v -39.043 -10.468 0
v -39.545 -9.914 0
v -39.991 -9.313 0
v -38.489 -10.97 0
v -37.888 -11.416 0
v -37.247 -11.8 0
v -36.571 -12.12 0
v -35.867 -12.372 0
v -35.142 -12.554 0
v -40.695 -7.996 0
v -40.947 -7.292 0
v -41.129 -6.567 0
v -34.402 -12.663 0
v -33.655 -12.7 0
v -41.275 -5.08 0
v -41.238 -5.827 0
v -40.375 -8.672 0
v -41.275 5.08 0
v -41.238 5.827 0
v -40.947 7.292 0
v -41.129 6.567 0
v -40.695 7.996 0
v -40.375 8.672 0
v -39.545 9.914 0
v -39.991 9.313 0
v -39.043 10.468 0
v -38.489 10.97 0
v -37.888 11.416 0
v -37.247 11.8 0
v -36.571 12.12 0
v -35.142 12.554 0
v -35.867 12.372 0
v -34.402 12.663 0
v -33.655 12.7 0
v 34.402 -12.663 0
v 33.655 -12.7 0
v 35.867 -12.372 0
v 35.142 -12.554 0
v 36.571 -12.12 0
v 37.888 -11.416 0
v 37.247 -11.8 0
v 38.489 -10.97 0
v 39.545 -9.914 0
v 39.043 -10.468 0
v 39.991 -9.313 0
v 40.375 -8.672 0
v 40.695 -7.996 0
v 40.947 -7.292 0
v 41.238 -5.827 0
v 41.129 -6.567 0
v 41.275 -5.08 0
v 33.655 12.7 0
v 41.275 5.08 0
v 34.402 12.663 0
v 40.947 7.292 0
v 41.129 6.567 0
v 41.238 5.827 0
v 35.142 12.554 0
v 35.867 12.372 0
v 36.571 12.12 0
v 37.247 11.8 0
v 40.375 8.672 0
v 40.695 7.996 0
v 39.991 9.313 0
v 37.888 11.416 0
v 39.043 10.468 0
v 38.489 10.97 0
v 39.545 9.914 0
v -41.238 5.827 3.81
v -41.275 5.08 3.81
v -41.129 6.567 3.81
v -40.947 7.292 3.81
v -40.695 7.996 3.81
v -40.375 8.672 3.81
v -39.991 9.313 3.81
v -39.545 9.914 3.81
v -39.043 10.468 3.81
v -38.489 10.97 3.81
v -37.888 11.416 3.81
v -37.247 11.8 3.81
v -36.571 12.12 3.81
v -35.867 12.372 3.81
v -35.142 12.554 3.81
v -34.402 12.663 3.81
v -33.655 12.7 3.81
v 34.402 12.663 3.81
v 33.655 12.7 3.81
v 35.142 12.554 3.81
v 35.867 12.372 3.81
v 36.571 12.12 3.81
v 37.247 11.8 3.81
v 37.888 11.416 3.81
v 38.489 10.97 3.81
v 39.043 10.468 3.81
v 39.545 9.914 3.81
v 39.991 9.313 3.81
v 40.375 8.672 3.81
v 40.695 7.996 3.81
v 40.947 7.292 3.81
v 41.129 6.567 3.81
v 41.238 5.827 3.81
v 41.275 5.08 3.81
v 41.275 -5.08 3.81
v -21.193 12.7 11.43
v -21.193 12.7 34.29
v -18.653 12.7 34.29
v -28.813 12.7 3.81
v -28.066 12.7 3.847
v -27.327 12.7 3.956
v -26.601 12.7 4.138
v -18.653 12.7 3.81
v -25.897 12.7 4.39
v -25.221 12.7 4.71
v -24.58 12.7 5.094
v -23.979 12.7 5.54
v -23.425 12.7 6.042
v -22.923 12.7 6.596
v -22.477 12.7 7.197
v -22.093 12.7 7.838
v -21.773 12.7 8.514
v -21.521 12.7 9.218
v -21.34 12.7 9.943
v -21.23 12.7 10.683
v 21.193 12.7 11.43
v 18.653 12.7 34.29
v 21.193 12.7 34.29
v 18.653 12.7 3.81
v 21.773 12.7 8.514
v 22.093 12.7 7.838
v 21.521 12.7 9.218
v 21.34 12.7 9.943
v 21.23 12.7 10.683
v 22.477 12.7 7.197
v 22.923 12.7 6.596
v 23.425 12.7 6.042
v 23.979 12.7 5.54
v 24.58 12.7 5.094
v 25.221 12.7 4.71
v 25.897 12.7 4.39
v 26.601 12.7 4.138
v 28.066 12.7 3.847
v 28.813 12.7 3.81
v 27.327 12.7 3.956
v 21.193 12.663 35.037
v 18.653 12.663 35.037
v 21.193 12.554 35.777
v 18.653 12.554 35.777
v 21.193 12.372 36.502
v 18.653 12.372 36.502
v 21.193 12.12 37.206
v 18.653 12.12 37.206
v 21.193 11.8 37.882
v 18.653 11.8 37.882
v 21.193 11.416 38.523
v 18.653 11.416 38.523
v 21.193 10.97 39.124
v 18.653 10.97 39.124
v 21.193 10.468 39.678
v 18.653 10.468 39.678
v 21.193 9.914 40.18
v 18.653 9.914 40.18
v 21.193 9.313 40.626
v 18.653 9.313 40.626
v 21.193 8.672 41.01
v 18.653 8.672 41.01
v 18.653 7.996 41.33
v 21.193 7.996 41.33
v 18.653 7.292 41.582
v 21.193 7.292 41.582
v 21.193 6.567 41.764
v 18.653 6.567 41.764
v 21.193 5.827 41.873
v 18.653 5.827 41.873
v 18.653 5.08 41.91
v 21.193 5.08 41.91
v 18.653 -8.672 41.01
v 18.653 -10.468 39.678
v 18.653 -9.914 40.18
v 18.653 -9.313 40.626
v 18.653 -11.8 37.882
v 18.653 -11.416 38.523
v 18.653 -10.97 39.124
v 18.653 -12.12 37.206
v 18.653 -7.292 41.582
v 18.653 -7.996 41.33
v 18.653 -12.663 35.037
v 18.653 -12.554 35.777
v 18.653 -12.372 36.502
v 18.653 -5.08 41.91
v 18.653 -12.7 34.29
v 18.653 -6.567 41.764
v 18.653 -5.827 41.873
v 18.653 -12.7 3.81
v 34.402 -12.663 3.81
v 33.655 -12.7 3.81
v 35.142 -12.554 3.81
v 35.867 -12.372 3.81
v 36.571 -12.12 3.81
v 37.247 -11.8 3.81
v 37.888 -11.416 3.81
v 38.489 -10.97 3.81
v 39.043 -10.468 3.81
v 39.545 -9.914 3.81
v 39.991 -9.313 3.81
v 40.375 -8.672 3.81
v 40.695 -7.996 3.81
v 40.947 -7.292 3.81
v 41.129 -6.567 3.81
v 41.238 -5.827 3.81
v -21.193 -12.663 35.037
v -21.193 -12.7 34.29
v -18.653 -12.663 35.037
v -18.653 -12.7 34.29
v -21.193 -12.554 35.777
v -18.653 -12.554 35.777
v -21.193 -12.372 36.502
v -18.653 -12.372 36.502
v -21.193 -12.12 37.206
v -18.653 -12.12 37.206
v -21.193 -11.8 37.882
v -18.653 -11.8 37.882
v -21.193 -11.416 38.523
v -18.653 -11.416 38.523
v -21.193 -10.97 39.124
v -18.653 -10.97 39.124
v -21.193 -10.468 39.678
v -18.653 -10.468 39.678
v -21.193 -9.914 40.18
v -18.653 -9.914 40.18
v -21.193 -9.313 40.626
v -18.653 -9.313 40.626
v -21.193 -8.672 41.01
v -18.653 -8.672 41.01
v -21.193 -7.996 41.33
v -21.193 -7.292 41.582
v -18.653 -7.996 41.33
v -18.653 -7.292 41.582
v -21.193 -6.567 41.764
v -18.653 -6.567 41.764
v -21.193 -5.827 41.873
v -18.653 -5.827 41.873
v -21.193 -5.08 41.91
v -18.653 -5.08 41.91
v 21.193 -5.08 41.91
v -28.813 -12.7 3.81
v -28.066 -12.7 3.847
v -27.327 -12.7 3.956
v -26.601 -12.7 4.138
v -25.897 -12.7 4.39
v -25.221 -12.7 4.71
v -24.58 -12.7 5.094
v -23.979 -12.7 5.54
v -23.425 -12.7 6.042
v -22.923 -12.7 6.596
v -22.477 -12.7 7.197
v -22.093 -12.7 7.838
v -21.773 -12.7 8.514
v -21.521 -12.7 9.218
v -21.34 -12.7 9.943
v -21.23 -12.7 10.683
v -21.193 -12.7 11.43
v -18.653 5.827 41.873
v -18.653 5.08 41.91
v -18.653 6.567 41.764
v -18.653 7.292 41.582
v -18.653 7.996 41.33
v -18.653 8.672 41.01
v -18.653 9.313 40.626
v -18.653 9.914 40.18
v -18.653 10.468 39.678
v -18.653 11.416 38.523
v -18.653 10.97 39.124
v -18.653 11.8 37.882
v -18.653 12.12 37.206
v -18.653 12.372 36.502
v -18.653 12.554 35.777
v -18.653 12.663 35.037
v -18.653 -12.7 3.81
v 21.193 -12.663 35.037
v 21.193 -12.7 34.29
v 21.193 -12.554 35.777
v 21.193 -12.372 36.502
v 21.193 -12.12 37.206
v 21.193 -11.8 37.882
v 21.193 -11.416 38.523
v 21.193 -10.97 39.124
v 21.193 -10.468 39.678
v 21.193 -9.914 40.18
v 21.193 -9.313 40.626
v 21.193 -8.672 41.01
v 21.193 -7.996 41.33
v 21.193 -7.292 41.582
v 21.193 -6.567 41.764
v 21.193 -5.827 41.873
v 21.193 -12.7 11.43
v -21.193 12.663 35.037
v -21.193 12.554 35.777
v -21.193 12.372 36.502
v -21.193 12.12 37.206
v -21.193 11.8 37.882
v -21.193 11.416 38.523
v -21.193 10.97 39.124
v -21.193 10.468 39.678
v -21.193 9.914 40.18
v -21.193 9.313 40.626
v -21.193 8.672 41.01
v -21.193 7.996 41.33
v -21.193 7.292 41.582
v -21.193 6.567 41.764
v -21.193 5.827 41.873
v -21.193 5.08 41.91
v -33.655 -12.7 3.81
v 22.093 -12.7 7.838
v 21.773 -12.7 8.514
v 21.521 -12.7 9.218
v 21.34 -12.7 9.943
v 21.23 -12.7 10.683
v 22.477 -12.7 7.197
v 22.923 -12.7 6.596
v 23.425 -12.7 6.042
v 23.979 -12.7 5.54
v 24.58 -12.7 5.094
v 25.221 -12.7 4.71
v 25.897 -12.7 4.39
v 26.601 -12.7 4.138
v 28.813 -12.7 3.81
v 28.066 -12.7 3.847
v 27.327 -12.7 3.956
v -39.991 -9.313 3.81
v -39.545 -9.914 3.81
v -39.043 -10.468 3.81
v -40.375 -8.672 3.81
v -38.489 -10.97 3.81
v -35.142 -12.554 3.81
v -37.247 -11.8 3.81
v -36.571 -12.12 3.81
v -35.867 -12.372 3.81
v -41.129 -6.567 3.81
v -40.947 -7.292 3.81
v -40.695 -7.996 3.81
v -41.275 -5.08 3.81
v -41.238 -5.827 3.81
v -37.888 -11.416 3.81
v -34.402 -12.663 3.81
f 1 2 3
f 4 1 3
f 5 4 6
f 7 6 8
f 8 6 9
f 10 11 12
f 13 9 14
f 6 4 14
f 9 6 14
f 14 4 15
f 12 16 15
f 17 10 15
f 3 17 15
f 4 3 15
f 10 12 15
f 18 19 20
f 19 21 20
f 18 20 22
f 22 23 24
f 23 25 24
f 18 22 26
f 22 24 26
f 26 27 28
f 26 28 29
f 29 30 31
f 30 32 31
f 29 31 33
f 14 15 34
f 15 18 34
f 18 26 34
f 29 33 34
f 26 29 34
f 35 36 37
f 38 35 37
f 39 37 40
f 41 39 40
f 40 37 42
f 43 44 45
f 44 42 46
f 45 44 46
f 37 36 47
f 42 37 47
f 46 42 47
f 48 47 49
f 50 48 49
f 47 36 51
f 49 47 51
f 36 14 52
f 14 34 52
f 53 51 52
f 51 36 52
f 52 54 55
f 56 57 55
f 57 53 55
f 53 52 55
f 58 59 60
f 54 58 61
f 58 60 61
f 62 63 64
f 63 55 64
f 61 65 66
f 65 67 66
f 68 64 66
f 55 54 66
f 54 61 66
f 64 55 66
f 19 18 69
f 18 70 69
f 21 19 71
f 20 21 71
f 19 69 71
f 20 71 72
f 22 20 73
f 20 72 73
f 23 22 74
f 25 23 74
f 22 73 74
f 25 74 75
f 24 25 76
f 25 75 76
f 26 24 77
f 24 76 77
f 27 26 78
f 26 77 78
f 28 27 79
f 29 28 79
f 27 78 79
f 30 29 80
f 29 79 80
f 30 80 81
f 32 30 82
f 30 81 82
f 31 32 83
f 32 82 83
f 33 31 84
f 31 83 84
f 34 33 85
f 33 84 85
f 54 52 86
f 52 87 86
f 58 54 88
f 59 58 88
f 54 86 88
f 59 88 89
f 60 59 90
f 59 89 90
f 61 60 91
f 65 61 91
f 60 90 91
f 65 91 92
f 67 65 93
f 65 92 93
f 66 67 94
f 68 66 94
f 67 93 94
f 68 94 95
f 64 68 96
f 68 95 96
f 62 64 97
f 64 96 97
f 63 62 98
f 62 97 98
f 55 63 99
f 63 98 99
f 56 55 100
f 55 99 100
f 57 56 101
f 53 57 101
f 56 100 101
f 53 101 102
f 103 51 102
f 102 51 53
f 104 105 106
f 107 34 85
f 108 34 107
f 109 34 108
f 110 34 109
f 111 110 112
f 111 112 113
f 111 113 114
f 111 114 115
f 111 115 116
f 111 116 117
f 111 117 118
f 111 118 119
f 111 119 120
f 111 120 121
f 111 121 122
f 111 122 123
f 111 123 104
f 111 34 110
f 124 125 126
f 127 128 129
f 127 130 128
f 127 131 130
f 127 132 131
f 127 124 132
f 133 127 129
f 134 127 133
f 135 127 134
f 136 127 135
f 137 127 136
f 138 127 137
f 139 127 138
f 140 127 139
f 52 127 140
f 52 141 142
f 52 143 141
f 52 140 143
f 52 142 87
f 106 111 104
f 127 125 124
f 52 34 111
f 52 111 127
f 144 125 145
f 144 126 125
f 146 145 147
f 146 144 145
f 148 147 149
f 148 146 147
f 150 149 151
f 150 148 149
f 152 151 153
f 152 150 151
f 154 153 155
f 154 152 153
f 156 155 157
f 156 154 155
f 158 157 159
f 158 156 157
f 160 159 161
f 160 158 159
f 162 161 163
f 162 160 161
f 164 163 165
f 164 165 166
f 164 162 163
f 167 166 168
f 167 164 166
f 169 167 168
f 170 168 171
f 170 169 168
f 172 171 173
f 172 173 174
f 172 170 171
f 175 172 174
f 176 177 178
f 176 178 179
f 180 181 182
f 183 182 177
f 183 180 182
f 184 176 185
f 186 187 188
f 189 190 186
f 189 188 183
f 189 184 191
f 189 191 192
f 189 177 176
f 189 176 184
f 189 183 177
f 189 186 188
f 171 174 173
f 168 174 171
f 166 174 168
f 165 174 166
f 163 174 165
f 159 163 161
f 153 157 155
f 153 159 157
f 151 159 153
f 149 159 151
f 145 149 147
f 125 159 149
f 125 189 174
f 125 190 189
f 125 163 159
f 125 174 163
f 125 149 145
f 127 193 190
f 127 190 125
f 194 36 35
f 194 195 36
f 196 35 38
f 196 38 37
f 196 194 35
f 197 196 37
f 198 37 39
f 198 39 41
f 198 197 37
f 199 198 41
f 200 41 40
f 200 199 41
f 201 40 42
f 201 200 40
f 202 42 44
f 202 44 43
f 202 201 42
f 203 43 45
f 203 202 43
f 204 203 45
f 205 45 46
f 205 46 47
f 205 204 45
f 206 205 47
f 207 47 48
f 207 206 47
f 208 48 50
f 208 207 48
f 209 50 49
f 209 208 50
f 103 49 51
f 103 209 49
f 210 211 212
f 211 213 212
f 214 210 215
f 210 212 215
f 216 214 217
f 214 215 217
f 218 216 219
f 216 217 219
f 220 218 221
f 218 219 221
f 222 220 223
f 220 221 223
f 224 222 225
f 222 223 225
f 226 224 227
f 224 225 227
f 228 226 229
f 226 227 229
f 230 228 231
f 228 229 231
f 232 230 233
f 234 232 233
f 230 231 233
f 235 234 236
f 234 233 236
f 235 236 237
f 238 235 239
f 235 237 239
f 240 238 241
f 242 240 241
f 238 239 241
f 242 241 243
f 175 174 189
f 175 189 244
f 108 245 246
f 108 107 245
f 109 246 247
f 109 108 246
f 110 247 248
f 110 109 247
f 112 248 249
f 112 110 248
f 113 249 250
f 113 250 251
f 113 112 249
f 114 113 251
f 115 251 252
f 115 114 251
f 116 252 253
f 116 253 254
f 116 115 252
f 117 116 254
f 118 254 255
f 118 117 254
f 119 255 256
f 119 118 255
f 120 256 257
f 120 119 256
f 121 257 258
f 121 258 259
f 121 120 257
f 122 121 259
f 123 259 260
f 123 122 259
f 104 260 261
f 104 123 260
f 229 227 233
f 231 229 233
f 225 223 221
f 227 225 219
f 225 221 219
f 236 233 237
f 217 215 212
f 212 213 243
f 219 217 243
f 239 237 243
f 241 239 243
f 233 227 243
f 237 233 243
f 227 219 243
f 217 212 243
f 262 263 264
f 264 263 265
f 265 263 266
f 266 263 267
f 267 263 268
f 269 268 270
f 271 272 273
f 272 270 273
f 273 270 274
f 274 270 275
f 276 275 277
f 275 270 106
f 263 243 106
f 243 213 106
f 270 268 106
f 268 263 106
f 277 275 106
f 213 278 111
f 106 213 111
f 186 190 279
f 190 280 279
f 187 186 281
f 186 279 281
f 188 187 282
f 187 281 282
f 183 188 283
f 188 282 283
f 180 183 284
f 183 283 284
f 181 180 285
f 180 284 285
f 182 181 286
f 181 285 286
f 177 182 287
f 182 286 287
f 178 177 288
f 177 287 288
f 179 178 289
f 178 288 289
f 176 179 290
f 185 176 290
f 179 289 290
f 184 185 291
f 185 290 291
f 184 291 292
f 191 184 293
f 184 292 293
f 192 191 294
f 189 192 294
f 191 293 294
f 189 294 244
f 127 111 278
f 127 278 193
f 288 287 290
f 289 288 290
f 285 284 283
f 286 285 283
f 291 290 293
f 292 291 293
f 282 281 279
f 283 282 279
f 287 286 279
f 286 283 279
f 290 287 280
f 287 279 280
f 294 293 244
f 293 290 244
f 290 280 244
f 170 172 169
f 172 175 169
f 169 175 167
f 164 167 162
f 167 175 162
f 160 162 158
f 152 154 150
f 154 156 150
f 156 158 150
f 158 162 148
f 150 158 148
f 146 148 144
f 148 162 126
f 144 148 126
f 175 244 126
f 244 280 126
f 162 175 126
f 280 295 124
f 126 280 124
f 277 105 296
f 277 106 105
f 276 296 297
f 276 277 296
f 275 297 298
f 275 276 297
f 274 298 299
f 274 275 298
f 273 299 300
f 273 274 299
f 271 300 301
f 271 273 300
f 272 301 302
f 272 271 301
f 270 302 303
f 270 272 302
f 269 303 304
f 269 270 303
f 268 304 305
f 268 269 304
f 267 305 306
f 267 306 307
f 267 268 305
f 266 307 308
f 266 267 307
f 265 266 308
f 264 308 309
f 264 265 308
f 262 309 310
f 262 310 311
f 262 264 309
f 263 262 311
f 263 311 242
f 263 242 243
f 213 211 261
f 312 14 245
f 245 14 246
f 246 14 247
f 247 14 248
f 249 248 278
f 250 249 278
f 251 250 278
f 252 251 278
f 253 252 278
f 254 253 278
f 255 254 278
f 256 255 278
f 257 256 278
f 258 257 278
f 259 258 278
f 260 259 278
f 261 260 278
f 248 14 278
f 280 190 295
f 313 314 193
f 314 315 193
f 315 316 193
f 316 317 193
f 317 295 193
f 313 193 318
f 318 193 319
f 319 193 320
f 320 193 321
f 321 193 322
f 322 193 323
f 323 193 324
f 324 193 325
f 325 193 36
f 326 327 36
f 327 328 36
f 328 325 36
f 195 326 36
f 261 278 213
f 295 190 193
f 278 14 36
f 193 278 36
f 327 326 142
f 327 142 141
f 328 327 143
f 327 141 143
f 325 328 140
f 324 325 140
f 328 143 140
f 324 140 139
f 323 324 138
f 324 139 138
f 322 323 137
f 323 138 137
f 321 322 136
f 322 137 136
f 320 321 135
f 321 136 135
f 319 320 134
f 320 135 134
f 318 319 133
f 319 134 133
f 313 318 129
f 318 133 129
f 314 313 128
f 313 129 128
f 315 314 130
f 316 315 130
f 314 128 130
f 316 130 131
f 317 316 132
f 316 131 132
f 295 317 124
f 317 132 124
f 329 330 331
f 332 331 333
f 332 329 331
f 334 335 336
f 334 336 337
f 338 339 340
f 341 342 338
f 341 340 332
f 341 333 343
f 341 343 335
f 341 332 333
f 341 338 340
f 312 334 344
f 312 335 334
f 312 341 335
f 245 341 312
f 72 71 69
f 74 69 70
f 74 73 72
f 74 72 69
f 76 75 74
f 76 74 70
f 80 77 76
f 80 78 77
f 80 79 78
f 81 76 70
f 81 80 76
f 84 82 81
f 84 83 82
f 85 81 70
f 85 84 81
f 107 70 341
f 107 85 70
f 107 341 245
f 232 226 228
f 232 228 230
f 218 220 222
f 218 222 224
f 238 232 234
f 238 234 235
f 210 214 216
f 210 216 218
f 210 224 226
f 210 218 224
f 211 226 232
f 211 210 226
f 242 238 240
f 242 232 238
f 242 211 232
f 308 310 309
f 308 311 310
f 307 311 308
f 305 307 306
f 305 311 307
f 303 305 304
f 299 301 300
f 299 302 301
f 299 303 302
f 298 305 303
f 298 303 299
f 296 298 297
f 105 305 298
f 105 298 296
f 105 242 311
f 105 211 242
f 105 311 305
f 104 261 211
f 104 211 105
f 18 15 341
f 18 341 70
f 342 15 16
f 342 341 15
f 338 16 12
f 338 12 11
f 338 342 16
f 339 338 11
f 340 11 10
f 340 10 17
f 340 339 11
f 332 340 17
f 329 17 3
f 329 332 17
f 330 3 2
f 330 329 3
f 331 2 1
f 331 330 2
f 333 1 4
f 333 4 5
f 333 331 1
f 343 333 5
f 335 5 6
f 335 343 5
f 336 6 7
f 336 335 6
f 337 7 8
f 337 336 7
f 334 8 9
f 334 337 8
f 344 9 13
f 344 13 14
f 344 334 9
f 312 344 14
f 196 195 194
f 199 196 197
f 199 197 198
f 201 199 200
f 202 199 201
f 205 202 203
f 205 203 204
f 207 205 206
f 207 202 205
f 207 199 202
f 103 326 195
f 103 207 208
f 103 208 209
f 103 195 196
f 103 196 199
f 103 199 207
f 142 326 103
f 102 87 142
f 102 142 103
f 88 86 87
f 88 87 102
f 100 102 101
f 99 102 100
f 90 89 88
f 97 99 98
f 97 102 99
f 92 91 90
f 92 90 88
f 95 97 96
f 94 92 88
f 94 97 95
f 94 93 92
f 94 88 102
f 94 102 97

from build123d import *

# Parameters (mm, degrees)
F0_W     = 82.55
F0_H     = 25.4
F1_DEPTH = 3.81
F2_W     = 2.54
F2_H     = 25.4
F3_DEPTH = 38.1
F4_R     = 7.62


with BuildPart() as f1:
    # F0 (on Top) → F1 (new body)
    with BuildSketch(Plane.XY):
        Rectangle(F0_W, F0_H)
    extrude(amount=F1_DEPTH)

    # F2 (on face) → F3 (join)
    with BuildSketch(Plane.XY.offset(3.81)):
        with Locations((-19.923125, 0)):
            Rectangle(F2_W, F2_H)
        with Locations((19.923125, 0)):
            Rectangle(F2_W, F2_H)
    extrude(amount=F3_DEPTH)

    # F4
    f4_edges = [f1.edges().sort_by_distance(p)[0] for p in [
        (-41.275, 12.7, 1.905),
        (-41.275, -12.7, 1.905),
        (41.275, 12.7, 1.905),
        (41.275, -12.7, 1.905),
        (-21.193125, 0, 3.81),
        (21.193125, 0, 3.81),
        (19.923125, 12.7, 41.91),
        (-19.923125, 12.7, 41.91),
        (-19.923125, -12.7, 41.91),
        (19.923125, -12.7, 41.91),
    ]]
    fillet(f4_edges, radius=F4_R)


solid = f1.part
